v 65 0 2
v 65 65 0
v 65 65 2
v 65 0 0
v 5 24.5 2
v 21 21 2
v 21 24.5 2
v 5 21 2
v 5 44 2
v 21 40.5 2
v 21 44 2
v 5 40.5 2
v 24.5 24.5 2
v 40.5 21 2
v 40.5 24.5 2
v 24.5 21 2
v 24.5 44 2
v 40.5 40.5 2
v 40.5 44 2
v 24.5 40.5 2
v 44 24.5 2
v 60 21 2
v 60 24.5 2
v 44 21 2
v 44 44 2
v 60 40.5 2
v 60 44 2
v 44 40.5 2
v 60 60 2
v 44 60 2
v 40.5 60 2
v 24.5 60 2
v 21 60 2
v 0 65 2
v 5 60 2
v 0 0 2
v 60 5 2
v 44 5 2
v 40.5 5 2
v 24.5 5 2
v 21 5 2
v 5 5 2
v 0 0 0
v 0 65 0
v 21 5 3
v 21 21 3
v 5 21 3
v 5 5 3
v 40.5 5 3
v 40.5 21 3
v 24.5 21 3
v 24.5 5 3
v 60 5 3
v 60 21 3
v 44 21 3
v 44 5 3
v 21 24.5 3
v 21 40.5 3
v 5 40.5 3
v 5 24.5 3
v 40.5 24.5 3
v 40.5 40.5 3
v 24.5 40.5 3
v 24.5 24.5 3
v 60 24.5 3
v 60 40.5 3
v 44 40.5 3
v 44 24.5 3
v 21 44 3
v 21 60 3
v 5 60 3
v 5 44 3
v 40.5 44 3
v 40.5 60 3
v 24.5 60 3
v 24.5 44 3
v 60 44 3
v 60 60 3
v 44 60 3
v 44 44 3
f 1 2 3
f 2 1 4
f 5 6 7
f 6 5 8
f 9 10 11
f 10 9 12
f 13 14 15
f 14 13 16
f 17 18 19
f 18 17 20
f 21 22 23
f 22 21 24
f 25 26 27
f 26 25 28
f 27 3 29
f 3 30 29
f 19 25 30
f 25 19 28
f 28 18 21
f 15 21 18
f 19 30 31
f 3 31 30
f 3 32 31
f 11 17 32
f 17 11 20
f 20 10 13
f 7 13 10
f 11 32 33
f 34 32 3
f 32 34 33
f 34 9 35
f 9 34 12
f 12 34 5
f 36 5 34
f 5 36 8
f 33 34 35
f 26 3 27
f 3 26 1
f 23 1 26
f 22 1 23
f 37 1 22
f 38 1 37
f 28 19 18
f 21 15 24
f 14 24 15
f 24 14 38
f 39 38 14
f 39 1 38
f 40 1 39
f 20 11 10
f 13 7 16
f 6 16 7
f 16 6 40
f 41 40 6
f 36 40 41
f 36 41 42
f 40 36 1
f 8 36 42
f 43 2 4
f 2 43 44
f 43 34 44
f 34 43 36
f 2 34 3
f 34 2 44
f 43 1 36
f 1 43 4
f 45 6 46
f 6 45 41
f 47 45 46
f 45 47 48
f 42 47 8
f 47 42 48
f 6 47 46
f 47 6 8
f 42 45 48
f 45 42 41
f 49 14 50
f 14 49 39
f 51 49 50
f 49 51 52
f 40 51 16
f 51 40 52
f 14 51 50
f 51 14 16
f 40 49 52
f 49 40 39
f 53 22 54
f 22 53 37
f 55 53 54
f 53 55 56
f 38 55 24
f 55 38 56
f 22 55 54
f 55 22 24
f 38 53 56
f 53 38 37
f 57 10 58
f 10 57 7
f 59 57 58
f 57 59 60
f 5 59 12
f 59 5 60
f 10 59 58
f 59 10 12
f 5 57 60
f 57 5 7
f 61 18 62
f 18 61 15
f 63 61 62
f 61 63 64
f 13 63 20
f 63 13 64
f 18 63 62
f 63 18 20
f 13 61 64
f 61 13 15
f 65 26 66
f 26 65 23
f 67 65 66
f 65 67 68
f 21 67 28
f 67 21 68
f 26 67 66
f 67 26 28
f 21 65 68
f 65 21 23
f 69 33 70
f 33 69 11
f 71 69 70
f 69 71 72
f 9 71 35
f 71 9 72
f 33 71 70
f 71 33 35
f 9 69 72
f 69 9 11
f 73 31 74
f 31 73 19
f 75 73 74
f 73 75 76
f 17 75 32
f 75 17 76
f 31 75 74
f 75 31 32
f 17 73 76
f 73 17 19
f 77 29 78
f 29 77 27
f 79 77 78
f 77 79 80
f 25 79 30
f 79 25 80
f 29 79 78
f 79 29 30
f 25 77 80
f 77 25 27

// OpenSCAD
bin_size=18;
wall_size=1.5;
base=2;
height=2;

extra_space=1;
extra_top=2.5;

  cube([bin_size*3+wall_size*4+extra_top*2, bin_size*3+wall_size*4+extra_top*2, height]);

cube_vector = [bin_size-extra_space*2, bin_size-extra_space*2, 1];

offset = extra_space + extra_top;

  translate([wall_size+offset, wall_size+offset, base]) cube(cube_vector);
  translate([wall_size*2+bin_size+offset, wall_size+offset, base]) cube(cube_vector);
  translate([wall_size*3+bin_size*2+offset, wall_size+offset, base]) cube(cube_vector);

  translate([wall_size*1+bin_size*0+offset, wall_size*2+bin_size*1+offset, base]) cube(cube_vector);
  translate([wall_size*2+bin_size*1+offset, wall_size*2+bin_size*1+offset, base]) cube(cube_vector);
  translate([wall_size*3+bin_size*2+offset, wall_size*2+bin_size*1+offset, base]) cube(cube_vector);

  translate([wall_size*1+bin_size*0+offset, wall_size*3+bin_size*2+offset, base]) cube(cube_vector);
  translate([wall_size*2+bin_size*1+offset, wall_size*3+bin_size*2+offset, base]) cube(cube_vector);
  translate([wall_size*3+bin_size*2+offset, wall_size*3+bin_size*2+offset, base]) cube(cube_vector);
